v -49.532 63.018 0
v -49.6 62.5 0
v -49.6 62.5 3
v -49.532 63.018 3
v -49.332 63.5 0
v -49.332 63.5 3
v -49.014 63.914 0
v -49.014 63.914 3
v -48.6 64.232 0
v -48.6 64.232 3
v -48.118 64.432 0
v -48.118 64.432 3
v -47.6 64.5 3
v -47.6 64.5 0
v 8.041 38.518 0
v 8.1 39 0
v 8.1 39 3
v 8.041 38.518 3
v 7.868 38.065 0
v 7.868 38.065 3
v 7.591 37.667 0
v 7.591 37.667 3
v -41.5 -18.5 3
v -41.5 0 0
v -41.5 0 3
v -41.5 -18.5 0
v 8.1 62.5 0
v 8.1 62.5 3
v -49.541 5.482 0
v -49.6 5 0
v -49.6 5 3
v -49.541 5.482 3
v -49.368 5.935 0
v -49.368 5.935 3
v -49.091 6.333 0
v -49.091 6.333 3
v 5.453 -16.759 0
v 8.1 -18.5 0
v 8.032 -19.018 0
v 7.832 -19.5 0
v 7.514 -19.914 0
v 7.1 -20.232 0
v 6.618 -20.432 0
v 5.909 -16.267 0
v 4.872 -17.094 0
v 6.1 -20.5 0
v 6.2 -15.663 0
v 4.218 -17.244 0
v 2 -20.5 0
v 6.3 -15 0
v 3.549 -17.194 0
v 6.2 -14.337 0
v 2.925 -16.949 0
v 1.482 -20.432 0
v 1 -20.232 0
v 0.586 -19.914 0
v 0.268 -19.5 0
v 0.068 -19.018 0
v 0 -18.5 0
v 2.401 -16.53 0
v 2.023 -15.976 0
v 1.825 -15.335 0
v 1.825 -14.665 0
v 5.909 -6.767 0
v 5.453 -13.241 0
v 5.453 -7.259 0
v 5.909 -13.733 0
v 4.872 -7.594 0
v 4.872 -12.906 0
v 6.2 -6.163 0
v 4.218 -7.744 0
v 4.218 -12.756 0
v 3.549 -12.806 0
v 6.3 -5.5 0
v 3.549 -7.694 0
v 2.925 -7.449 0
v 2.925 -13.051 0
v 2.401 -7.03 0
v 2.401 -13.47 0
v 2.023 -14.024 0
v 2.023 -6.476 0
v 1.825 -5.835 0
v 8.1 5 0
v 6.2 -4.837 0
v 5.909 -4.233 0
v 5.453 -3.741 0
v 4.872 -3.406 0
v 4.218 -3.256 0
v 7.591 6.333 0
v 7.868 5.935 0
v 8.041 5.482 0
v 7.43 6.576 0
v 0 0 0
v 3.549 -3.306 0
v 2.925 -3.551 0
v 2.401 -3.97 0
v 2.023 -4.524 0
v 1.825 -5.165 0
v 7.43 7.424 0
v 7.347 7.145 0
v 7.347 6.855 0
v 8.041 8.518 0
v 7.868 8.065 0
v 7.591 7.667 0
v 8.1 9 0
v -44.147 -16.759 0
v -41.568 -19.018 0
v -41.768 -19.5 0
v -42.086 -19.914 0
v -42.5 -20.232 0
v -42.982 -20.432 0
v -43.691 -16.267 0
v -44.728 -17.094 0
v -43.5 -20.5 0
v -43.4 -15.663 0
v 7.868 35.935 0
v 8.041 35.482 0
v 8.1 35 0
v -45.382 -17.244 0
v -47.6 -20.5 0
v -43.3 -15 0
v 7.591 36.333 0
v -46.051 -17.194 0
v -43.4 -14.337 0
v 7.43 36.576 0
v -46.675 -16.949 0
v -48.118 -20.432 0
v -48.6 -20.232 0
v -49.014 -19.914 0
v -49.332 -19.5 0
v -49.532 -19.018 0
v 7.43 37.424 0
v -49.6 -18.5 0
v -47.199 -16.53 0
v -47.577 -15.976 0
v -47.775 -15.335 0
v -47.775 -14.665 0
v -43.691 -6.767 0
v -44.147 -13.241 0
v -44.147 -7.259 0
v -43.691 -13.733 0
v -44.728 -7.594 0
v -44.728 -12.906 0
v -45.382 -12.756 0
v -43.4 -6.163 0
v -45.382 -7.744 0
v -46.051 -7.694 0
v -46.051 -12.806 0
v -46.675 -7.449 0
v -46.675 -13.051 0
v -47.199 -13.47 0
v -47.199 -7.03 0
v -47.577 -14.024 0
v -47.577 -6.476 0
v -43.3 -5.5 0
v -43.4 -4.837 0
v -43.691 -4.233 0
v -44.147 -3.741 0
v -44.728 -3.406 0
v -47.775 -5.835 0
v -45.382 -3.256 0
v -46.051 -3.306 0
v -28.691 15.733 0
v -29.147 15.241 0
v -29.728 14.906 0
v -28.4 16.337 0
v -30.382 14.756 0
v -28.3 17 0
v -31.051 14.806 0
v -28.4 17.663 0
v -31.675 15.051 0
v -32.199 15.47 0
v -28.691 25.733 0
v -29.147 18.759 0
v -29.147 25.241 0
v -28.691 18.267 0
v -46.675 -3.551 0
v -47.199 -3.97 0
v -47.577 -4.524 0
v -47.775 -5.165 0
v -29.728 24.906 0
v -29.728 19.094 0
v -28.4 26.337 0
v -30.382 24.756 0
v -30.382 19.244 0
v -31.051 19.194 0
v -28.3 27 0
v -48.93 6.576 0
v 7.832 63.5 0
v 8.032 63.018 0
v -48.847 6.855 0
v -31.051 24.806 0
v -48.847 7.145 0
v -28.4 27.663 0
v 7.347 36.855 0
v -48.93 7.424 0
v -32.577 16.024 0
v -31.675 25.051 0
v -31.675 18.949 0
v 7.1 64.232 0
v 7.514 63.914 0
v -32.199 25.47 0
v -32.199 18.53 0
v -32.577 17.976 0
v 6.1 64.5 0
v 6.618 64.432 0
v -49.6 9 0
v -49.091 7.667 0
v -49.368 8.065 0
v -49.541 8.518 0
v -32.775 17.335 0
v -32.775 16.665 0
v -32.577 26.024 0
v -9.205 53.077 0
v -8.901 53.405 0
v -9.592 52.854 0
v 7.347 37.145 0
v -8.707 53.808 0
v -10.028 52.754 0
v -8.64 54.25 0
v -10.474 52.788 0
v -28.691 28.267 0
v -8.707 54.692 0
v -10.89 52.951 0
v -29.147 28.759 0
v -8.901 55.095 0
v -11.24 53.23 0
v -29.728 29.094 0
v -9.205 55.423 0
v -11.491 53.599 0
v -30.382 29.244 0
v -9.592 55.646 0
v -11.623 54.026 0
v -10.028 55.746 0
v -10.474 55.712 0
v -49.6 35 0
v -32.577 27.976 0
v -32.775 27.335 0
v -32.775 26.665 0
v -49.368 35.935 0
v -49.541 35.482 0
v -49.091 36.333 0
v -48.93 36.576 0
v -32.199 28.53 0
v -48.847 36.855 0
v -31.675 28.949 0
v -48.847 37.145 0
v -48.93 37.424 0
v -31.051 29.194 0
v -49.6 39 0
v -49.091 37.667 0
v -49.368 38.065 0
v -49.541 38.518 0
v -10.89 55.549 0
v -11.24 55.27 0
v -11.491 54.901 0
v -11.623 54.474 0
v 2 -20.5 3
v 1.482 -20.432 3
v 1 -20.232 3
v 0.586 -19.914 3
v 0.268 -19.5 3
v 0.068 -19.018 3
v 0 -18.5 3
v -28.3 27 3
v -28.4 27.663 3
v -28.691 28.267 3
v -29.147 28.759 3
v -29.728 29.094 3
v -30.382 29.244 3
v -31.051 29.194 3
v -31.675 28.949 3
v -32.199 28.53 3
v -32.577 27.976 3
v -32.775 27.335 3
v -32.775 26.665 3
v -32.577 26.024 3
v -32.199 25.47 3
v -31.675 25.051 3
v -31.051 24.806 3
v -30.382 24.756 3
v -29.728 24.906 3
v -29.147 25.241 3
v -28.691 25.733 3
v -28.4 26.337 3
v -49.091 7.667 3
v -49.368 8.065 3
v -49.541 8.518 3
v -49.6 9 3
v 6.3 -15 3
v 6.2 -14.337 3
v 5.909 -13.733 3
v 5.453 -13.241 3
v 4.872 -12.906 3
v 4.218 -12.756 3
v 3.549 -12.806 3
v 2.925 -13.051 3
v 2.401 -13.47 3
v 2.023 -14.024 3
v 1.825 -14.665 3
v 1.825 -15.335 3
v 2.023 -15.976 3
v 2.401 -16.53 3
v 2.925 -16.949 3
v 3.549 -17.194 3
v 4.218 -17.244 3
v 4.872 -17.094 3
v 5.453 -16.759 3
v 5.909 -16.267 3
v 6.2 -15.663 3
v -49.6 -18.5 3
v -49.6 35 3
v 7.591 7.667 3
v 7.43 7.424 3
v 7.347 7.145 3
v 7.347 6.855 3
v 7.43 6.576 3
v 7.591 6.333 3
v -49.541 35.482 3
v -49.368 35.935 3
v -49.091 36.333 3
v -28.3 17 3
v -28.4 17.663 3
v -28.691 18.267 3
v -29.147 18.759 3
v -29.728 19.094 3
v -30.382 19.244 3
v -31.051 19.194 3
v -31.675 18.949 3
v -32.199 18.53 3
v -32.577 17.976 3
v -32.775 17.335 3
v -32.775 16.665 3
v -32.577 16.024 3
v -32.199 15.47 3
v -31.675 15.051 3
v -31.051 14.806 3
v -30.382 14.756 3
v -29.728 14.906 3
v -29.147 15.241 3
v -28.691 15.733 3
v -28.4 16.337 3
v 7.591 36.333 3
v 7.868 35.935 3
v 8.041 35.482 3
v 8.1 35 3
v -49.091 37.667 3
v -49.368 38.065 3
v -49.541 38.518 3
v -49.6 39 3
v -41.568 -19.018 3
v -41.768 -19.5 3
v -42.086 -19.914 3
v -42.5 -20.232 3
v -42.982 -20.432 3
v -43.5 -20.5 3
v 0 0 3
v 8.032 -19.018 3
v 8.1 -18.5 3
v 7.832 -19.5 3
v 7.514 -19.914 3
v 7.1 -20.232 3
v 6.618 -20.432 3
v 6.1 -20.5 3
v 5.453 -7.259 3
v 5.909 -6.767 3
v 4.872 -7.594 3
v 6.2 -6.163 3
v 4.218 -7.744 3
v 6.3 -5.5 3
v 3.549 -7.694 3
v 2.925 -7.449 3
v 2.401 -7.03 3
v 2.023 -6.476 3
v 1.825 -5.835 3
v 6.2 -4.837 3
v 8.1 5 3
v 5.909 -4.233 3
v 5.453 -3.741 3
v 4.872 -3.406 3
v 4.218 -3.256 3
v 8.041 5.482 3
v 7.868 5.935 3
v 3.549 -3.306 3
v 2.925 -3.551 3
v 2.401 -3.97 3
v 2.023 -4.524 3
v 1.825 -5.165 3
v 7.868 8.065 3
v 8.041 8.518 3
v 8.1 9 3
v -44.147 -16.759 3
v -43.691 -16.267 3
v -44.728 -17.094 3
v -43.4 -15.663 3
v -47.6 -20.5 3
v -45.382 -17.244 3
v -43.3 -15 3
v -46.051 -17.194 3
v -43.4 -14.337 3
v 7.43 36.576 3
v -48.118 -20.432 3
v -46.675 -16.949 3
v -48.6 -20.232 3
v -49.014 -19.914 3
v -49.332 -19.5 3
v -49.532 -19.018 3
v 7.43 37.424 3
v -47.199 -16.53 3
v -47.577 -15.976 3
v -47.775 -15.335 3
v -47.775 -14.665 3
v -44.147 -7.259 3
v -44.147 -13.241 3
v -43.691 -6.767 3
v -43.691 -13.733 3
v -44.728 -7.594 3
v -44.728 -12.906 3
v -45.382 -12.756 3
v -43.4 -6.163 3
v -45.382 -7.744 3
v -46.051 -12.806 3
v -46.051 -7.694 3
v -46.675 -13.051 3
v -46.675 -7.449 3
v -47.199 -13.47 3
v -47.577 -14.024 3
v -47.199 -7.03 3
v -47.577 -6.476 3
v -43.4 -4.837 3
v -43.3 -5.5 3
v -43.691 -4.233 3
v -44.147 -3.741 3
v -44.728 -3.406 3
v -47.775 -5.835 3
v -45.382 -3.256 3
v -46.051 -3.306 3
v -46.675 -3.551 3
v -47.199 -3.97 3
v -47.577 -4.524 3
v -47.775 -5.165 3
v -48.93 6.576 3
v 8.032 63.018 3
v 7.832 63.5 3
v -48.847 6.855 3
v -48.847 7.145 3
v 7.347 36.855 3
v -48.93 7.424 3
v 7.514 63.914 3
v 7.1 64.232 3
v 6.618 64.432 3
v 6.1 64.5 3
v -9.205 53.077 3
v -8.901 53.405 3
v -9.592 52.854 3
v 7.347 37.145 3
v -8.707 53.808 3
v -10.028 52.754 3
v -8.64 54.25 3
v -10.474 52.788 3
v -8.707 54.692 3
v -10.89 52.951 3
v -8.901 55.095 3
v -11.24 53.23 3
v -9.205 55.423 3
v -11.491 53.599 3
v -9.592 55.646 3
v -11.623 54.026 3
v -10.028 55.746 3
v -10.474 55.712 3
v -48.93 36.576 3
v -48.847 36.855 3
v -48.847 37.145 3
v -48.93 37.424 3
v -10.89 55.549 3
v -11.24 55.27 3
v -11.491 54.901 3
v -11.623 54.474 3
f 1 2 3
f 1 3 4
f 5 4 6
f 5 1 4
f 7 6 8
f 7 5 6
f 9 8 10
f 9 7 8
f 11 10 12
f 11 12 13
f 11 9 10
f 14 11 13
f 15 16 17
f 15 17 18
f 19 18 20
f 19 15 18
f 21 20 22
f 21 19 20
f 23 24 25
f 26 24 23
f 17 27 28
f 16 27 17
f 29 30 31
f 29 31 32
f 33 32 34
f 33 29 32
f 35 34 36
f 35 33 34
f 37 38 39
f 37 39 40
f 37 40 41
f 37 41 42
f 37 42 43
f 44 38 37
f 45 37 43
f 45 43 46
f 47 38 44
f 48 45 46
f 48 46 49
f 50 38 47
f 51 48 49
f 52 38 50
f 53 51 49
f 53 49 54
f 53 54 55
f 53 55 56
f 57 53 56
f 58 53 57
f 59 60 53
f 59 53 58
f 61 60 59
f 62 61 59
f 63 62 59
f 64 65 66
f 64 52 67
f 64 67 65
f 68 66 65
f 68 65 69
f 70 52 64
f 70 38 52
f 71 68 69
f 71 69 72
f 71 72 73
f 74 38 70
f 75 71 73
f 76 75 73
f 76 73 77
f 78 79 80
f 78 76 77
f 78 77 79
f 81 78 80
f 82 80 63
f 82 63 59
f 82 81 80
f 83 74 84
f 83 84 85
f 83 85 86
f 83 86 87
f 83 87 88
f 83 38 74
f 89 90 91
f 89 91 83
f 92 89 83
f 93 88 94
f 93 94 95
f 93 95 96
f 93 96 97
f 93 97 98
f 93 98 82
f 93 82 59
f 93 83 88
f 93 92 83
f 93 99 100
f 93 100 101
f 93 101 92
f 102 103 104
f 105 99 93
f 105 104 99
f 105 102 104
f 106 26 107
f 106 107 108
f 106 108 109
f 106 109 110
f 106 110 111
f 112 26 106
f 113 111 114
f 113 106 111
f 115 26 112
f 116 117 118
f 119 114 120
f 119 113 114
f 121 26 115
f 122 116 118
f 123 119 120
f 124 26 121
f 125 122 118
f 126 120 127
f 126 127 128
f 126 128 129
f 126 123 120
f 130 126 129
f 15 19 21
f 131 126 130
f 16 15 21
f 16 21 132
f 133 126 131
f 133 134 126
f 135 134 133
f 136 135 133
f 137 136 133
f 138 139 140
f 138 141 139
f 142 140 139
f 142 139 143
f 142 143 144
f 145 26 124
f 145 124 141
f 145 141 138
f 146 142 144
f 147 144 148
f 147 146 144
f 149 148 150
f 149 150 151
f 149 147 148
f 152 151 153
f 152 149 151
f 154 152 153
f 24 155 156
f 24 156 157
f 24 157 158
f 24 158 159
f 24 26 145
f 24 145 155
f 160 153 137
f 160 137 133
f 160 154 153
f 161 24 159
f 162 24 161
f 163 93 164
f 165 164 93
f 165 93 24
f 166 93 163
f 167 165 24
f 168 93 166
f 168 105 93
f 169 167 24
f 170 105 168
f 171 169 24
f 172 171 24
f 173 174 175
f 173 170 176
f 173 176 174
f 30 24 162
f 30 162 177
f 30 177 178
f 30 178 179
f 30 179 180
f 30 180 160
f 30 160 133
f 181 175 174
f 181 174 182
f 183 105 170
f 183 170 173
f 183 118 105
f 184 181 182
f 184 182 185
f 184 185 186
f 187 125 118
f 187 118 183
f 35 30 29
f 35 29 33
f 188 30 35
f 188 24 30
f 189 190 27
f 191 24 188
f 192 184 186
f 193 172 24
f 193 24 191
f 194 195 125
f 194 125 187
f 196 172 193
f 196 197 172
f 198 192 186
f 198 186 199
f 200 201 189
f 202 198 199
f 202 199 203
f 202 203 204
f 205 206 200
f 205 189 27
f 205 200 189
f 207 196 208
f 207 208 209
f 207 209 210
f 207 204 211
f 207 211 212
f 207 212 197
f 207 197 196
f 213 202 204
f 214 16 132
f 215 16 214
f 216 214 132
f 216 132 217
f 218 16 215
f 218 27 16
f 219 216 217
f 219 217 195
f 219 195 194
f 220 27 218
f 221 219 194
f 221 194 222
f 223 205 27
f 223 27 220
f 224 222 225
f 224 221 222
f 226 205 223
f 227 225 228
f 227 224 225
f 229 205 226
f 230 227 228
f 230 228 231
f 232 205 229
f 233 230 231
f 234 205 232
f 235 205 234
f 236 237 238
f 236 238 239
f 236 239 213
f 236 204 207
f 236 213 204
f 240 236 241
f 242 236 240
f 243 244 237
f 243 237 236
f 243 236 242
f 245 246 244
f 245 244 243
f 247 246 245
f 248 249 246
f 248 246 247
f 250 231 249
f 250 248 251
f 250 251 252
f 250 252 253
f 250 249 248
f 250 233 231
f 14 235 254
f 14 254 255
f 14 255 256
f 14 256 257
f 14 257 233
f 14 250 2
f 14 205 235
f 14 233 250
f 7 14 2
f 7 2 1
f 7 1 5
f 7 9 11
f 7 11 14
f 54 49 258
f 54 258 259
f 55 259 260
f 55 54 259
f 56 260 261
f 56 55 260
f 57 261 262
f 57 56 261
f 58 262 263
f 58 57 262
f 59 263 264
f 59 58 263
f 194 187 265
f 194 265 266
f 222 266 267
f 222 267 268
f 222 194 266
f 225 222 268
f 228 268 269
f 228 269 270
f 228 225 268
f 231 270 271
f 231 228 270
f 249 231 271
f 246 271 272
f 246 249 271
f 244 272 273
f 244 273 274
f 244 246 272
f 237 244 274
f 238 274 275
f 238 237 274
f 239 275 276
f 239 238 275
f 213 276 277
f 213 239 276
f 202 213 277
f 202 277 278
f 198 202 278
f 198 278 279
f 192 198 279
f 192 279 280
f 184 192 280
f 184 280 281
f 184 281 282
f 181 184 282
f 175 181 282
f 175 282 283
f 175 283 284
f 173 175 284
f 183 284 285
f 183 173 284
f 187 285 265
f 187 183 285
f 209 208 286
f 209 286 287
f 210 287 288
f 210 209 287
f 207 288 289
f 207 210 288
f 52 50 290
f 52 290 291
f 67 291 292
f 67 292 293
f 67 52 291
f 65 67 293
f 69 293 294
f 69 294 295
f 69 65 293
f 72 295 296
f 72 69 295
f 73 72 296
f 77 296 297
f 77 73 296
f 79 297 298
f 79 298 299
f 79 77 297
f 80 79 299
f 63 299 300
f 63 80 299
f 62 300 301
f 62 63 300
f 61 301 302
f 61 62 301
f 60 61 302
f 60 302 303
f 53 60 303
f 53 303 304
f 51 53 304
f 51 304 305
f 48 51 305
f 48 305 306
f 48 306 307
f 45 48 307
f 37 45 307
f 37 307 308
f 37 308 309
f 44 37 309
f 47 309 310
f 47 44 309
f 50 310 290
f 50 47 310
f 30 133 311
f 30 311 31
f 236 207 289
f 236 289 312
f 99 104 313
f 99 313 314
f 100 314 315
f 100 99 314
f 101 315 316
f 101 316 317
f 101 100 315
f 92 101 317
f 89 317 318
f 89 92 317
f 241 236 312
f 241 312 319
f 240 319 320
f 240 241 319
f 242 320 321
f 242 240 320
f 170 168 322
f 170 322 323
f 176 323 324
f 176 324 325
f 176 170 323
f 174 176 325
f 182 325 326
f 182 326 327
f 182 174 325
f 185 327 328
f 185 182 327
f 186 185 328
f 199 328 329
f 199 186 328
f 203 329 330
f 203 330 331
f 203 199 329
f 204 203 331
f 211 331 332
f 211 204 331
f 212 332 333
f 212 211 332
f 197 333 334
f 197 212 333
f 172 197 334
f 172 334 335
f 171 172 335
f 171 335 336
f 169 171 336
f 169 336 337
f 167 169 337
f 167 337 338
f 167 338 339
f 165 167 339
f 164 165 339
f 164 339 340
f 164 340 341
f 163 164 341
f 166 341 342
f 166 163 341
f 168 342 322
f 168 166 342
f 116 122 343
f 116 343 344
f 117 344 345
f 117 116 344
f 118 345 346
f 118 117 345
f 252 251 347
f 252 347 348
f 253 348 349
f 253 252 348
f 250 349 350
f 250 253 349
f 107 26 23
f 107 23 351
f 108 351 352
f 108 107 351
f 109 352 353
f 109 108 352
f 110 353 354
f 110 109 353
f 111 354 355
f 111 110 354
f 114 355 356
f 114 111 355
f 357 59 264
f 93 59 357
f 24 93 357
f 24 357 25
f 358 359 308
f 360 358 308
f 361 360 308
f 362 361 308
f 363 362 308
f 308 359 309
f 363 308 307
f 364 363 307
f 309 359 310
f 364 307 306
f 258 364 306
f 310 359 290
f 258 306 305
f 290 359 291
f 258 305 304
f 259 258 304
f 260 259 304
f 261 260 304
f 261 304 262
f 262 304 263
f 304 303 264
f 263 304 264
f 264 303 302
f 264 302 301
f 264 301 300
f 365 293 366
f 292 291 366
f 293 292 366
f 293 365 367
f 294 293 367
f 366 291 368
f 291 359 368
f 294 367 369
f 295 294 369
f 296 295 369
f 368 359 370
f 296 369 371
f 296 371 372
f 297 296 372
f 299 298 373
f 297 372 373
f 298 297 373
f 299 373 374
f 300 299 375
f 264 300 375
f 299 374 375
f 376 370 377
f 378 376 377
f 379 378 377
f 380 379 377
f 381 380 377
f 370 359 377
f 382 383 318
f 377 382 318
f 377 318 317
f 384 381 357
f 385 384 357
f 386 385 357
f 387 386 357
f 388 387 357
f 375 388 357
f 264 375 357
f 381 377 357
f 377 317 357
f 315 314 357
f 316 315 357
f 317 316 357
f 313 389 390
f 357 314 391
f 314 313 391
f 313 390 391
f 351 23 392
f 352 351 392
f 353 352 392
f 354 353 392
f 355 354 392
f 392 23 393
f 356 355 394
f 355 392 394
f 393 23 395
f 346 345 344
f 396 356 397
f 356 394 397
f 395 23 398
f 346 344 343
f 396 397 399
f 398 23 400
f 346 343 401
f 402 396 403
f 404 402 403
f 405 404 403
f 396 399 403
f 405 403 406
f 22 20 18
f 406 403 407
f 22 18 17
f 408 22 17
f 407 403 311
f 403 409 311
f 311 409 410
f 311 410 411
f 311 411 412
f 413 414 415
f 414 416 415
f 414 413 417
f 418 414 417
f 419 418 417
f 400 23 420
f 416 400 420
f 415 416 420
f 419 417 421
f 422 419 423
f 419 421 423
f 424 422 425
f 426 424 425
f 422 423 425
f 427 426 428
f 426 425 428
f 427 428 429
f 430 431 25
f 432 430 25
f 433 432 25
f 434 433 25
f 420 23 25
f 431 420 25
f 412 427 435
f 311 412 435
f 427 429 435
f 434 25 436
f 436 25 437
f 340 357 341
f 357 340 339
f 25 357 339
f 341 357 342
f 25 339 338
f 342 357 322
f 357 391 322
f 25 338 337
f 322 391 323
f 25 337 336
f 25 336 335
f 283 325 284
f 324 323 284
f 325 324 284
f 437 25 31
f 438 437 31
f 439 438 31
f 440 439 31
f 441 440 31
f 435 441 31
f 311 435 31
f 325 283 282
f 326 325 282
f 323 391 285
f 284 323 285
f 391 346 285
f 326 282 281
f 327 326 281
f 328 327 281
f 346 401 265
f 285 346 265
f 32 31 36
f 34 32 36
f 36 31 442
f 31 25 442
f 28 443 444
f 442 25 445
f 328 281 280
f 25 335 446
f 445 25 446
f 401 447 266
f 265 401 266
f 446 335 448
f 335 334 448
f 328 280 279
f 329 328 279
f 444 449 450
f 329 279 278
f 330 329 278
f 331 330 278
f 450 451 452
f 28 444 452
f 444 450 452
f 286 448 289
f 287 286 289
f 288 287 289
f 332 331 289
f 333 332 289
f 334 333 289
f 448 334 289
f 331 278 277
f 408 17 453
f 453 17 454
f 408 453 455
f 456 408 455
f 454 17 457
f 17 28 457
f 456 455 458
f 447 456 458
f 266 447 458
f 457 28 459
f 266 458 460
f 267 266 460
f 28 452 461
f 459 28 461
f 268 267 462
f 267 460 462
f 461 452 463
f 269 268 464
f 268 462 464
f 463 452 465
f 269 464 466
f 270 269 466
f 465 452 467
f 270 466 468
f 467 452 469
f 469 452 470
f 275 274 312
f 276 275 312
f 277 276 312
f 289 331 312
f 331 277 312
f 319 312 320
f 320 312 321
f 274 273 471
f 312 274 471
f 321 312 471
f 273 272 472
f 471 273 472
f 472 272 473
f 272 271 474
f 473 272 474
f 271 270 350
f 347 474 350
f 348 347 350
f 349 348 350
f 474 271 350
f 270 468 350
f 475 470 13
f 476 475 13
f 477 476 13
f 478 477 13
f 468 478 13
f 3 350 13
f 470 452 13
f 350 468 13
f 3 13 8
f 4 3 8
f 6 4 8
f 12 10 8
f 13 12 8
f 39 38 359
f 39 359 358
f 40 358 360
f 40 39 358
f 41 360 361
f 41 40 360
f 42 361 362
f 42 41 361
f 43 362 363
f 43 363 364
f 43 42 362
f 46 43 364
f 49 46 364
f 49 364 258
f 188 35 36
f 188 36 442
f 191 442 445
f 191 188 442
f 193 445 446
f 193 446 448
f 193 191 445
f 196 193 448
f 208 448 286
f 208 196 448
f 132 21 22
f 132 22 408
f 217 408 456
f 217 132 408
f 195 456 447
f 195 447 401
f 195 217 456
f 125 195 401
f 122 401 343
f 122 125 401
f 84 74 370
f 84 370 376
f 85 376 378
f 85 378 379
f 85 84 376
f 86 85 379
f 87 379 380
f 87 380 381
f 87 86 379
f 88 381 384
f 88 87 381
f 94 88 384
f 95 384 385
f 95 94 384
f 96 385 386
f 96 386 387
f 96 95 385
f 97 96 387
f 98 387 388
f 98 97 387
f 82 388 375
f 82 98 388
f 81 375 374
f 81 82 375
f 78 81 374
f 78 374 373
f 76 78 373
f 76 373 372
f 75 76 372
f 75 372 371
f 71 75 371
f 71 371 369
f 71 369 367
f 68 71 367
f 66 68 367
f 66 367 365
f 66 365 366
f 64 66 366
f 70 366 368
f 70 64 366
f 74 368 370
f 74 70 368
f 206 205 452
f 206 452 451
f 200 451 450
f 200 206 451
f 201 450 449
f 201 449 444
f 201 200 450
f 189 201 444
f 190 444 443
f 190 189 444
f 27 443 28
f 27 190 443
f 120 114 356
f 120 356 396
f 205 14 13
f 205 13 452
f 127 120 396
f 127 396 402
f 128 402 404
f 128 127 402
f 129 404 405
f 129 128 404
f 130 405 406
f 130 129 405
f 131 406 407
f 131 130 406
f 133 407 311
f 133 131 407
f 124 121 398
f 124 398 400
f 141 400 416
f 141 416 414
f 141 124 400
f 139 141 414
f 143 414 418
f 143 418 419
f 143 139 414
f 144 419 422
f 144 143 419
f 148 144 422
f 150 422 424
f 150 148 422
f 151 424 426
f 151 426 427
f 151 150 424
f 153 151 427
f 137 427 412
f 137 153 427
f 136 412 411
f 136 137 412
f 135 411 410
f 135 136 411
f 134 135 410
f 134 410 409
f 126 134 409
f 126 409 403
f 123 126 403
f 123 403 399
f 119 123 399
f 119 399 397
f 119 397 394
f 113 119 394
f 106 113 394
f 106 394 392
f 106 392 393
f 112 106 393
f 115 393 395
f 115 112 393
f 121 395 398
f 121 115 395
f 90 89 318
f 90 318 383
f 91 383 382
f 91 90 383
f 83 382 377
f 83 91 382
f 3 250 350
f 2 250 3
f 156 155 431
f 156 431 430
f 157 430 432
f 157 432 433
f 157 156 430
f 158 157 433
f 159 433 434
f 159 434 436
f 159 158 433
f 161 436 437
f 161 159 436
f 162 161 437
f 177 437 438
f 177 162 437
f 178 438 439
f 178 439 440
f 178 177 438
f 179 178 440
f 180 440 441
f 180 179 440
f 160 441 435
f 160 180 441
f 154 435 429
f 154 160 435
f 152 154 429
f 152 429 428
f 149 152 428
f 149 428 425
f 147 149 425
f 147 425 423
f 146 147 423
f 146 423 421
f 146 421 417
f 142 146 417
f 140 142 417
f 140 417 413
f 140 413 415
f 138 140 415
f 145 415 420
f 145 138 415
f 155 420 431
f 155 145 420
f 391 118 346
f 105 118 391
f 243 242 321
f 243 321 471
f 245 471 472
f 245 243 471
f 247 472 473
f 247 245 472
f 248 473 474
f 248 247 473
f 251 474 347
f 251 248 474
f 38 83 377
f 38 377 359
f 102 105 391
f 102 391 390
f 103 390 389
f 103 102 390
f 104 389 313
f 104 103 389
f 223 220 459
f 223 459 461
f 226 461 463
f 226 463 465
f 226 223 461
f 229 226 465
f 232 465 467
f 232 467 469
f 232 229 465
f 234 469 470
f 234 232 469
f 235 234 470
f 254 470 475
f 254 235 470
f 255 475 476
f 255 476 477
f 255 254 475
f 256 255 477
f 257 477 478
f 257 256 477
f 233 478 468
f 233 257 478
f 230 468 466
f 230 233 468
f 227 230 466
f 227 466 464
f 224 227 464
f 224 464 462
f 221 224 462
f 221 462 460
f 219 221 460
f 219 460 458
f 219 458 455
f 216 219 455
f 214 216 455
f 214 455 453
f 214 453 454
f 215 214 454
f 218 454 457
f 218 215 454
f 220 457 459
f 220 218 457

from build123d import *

# Parameters (mm, degrees)
SKETCH1_R           = 2.25
SKETCH1_R_2         = 1.5
BOSS_EXTRUDE1_DEPTH = 3


with BuildPart() as part:
    # Sketch1 → Boss-Extrude1 (new body)
    with BuildSketch(Plane.XY):
        with BuildLine():
            Line((-43.5, -20.5), (-47.6, -20.5))
            ThreePointArc((-47.6, -20.5), (-49.014213562, -19.914213562), (-49.6, -18.5))
            Line((-49.6, -18.5), (-49.6, 5))
            ThreePointArc((-49.6, 5), (-49.468344718, 5.71364418), (-49.090711985, 6.333333333))
            ThreePointArc((-49.090711985, 6.333333333), (-48.836067978, 7), (-49.090711985, 7.666666667))
            ThreePointArc((-49.090711985, 7.666666667), (-49.468344718, 8.28635582), (-49.6, 9))
            Line((-49.6, 9), (-49.6, 35))
            ThreePointArc((-49.6, 35), (-49.468344718, 35.71364418), (-49.090711985, 36.333333333))
            ThreePointArc((-49.090711985, 36.333333333), (-48.836067978, 37), (-49.090711985, 37.666666667))
            ThreePointArc((-49.090711985, 37.666666667), (-49.468344718, 38.28635582), (-49.6, 39))
            Line((-49.6, 39), (-49.6, 62.5))
            ThreePointArc((-49.6, 62.5), (-49.014213562, 63.914213562), (-47.6, 64.5))
            Line((-47.6, 64.5), (6.1, 64.5))
            ThreePointArc((6.1, 64.5), (7.514213562, 63.914213562), (8.1, 62.5))
            Line((8.1, 62.5), (8.1, 39))
            ThreePointArc((8.1, 39), (7.968344718, 38.28635582), (7.590711985, 37.666666667))
            ThreePointArc((7.590711985, 37.666666667), (7.336067978, 37), (7.590711985, 36.333333333))
            ThreePointArc((7.590711985, 36.333333333), (7.968344718, 35.71364418), (8.1, 35))
            Line((8.1, 35), (8.1, 9))
            ThreePointArc((8.1, 9), (7.968344718, 8.28635582), (7.590711985, 7.666666667))
            ThreePointArc((7.590711985, 7.666666667), (7.336067978, 7), (7.590711985, 6.333333333))
            ThreePointArc((7.590711985, 6.333333333), (7.968344718, 5.71364418), (8.1, 5))
            Line((8.1, 5), (8.1, -18.5))
            ThreePointArc((8.1, -18.5), (7.514213562, -19.914213562), (6.1, -20.5))
            Line((6.1, -20.5), (2, -20.5))
            ThreePointArc((2, -20.5), (0.585786438, -19.914213562), (0, -18.5))
            Line((0, -18.5), (0, 0))
            Line((0, 0), (-41.5, 0))
            Line((-41.5, 0), (-41.5, -18.5))
            ThreePointArc((-41.5, -18.5), (-42.085786438, -19.914213562), (-43.5, -20.5))
        make_face()
        with Locations((-45.55, -5.5)):
            Circle(SKETCH1_R, mode=Mode.SUBTRACT)
        with Locations((-45.55, -15)):
            Circle(SKETCH1_R, mode=Mode.SUBTRACT)
        with Locations((4.05, -5.5)):
            Circle(SKETCH1_R, mode=Mode.SUBTRACT)
        with Locations((4.05, -15)):
            Circle(SKETCH1_R, mode=Mode.SUBTRACT)
        with Locations((-30.55, 17)):
            Circle(SKETCH1_R, mode=Mode.SUBTRACT)
        with Locations((-30.55, 27)):
            Circle(SKETCH1_R, mode=Mode.SUBTRACT)
        with Locations((-10.14, 54.25)):
            Circle(SKETCH1_R_2, mode=Mode.SUBTRACT)
    extrude(amount=BOSS_EXTRUDE1_DEPTH)


solid = part.part
